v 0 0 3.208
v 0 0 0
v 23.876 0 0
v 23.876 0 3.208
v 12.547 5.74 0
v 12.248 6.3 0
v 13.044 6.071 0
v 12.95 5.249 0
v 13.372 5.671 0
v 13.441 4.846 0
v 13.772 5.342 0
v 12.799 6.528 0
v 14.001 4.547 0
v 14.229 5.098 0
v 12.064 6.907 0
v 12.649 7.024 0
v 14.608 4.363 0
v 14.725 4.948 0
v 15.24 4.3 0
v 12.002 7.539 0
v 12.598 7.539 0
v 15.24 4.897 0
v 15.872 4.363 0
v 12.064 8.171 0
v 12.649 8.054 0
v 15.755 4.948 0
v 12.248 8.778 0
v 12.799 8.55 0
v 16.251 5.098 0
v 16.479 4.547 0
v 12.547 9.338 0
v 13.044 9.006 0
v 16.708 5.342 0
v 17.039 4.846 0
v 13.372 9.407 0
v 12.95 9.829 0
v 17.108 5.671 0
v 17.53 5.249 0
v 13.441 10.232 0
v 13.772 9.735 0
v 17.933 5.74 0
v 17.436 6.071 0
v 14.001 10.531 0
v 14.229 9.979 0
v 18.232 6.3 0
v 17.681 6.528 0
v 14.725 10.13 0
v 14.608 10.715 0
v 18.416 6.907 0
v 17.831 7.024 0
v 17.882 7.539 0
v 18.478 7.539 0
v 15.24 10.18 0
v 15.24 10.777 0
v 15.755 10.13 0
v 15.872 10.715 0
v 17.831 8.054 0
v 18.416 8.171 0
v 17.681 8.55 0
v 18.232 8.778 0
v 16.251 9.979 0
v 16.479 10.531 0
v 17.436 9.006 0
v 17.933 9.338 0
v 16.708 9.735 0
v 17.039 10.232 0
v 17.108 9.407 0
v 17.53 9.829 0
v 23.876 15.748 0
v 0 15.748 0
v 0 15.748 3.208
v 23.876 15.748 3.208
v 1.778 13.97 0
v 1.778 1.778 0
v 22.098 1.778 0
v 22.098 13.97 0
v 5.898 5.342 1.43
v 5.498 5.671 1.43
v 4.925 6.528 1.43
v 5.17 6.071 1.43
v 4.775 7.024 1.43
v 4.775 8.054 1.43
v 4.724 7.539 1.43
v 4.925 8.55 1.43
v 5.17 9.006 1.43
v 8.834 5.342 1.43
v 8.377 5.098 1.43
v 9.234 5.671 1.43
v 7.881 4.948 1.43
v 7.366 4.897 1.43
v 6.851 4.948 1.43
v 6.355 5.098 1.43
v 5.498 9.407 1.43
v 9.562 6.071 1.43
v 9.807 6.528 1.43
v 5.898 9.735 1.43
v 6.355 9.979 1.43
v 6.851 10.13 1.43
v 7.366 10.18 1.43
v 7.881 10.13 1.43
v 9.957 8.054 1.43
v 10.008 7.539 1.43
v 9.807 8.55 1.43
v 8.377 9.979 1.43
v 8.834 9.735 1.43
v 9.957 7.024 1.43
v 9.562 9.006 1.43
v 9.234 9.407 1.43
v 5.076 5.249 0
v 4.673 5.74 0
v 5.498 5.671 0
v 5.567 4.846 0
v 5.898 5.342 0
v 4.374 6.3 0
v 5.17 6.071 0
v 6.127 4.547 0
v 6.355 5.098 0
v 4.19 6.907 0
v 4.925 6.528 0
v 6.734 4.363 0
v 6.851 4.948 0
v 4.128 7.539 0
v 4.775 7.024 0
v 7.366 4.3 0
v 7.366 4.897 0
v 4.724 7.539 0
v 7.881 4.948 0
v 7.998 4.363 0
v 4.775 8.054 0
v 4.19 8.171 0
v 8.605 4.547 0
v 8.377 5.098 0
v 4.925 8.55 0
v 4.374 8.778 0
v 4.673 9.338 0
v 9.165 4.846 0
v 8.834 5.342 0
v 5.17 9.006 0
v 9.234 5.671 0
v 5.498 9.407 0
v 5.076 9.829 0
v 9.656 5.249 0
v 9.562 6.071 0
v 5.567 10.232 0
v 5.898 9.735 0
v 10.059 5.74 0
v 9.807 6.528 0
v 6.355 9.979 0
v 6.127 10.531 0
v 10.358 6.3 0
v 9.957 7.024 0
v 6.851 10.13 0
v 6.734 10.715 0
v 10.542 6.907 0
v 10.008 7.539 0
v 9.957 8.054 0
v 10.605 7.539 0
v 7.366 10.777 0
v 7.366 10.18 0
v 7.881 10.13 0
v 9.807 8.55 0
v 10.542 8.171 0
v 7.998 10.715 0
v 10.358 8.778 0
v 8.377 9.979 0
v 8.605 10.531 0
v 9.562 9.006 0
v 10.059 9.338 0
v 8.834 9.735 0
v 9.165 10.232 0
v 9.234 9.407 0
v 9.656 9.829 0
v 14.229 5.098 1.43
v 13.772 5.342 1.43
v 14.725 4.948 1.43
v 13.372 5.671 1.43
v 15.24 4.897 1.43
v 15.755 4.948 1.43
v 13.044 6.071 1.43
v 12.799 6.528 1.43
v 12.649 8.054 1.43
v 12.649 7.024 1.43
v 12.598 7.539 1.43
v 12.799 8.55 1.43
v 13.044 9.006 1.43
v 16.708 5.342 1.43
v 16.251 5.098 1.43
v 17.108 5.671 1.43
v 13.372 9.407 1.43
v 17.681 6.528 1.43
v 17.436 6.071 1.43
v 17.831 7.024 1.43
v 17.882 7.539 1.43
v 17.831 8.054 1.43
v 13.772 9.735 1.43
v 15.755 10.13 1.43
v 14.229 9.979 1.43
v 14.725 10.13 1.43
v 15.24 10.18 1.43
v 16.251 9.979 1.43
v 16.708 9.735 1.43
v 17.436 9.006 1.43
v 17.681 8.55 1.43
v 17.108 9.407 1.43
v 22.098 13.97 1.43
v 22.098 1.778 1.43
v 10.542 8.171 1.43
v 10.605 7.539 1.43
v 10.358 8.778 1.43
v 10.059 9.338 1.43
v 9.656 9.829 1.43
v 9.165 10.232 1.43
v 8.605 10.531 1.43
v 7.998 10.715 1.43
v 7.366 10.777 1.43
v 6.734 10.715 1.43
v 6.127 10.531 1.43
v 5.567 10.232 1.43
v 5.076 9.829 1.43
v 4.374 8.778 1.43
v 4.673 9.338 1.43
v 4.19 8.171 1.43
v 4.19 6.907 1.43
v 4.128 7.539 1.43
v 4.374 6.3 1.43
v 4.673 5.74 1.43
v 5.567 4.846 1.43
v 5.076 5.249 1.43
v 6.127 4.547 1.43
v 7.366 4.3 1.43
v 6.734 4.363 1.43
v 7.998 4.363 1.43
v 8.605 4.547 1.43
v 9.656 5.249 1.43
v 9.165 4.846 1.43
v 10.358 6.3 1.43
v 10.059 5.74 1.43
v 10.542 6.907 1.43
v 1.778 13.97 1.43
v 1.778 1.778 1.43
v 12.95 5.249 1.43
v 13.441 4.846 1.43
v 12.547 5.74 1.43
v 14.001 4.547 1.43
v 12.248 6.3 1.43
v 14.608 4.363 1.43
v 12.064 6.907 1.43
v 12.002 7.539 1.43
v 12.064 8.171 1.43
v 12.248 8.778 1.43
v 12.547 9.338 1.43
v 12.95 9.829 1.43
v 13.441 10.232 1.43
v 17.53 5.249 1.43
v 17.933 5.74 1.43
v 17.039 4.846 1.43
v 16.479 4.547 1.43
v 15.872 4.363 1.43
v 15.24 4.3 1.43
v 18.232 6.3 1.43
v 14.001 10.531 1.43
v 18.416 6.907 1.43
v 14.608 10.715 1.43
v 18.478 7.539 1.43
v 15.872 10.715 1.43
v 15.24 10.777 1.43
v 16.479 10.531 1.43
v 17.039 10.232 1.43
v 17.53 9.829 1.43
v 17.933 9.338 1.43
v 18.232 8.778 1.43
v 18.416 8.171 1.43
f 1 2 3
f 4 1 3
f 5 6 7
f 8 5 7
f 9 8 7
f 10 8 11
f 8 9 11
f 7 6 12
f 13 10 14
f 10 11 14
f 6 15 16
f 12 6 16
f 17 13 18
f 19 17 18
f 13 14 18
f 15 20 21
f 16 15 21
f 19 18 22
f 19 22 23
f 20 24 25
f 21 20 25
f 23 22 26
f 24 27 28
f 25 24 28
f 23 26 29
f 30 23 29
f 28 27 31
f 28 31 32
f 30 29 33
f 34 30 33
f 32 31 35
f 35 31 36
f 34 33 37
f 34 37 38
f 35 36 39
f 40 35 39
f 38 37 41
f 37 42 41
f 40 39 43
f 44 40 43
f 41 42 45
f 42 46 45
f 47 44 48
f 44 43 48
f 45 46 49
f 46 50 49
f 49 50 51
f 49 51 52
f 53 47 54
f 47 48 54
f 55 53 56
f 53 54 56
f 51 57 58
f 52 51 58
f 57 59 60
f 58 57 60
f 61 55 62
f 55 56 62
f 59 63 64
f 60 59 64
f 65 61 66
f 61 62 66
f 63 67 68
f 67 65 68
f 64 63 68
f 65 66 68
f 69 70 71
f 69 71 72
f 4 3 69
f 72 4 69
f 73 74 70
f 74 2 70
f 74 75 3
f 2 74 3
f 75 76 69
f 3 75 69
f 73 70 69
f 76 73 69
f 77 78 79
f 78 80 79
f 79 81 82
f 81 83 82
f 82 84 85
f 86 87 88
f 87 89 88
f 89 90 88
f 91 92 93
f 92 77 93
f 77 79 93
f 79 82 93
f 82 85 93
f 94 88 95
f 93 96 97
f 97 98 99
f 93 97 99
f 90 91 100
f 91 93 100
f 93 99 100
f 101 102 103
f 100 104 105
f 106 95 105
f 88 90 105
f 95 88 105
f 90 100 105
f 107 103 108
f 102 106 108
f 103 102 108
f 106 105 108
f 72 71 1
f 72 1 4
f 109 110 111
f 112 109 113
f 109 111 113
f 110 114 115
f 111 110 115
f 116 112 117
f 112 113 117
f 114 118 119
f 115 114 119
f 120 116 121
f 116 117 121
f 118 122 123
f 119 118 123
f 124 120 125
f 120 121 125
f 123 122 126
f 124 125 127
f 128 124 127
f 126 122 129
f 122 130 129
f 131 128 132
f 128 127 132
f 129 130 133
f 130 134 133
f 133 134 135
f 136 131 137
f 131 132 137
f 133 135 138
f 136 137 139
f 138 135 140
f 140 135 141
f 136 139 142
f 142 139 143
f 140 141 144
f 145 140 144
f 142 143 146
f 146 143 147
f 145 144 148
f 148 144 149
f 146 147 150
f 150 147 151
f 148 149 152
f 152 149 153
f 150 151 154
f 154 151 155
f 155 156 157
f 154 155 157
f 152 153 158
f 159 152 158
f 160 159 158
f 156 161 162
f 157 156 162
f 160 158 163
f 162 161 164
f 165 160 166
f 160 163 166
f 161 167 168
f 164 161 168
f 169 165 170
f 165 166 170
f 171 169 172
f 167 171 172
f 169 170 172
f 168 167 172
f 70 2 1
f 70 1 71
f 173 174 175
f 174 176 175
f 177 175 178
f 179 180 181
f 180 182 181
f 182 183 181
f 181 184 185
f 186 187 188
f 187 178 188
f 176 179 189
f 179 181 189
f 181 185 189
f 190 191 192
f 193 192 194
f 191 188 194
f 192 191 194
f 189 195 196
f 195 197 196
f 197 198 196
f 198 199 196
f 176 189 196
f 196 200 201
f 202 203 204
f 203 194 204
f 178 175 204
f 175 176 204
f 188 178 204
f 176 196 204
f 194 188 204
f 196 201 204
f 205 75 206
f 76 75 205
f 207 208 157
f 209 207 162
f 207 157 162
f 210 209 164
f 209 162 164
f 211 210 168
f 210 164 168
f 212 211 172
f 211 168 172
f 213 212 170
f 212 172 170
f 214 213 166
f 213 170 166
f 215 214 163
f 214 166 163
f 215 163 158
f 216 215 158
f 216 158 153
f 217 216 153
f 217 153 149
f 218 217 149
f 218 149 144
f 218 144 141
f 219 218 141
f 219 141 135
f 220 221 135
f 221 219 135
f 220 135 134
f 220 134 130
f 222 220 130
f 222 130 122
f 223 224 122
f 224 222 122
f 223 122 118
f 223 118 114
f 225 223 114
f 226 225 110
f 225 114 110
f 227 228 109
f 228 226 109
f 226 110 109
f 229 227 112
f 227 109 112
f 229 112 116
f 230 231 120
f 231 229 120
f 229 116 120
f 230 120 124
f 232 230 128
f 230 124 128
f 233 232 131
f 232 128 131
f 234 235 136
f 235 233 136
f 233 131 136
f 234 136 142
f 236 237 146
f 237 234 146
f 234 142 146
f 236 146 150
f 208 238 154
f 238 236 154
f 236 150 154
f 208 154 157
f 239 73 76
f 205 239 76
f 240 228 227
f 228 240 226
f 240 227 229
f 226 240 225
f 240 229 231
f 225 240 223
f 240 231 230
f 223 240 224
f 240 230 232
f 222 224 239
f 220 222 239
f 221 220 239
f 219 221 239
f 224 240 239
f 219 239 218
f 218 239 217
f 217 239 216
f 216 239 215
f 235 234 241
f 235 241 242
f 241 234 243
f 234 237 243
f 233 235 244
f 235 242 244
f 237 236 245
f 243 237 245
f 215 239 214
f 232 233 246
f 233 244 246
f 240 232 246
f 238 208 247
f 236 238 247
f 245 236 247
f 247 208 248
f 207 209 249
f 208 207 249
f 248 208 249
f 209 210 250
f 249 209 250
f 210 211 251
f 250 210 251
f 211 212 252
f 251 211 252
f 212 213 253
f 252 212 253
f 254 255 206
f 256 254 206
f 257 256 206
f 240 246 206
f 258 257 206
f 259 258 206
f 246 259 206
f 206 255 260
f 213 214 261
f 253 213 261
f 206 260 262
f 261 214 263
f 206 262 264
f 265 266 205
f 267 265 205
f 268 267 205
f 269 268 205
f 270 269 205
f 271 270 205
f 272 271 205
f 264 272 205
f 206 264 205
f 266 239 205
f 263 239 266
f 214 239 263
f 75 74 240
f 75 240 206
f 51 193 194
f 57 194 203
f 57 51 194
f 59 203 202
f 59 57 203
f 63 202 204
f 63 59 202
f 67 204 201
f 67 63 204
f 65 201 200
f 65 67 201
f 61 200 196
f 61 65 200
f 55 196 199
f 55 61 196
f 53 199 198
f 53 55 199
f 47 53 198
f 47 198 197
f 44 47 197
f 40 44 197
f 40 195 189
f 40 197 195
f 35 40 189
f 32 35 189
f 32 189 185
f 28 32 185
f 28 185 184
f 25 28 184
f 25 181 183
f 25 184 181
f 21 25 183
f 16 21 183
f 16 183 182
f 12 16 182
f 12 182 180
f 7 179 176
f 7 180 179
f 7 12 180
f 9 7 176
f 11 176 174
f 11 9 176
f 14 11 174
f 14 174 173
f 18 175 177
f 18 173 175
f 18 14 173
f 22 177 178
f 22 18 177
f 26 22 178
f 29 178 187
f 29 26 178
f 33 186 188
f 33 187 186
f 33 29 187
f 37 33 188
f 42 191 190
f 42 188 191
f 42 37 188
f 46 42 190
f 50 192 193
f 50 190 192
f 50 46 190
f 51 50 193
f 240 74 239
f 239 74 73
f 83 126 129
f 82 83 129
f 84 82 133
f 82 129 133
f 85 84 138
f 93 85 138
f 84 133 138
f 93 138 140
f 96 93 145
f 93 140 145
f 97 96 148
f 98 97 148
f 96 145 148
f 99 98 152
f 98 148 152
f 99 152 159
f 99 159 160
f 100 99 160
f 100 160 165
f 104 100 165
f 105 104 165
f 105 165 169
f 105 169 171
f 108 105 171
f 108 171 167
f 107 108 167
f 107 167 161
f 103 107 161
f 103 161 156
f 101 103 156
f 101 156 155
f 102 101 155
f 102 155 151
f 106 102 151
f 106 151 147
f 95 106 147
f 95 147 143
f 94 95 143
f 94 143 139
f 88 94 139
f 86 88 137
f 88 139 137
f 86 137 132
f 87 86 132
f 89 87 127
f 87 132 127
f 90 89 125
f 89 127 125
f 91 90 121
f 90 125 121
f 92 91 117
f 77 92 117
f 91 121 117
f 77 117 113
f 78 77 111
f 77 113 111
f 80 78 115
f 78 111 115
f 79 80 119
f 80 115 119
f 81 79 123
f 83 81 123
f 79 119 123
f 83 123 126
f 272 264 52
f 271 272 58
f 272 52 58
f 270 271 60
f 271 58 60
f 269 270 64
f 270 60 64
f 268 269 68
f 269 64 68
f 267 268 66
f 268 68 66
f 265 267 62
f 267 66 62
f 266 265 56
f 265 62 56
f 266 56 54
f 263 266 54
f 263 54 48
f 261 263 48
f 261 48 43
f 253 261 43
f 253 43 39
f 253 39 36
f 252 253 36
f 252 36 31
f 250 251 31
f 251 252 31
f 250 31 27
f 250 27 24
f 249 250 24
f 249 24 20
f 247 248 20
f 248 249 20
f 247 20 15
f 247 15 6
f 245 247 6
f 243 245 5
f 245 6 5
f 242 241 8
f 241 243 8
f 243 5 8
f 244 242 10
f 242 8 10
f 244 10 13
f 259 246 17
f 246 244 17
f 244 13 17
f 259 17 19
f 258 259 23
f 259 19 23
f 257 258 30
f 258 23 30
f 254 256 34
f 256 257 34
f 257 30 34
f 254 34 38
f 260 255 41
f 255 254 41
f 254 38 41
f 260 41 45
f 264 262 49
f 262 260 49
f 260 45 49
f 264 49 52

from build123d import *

# Parameters (mm, degrees)
F0_W     = 23.876
F0_H     = 15.748
F1_DEPTH = 3.20802
F3_T     = -1.778
F4_R     = 3.2385
F4_R_2   = 2.6416
F5_DEPTH = 3.06898


# Not quite as in the source:
# - a feature names something its author has since deleted; it is built from what else it names


with BuildPart() as f1:
    # F0 (on Top) → F1 (new body)
    with BuildSketch(Plane.XY):
        with Locations((11.938, 7.874)):
            Rectangle(F0_W, F0_H)
    extrude(amount=F1_DEPTH)

    # F3
    f3_openings = [f1.faces().sort_by_distance(p)[0] for p in [
        (11.938, 7.874, 0),
    ]]
    offset(amount=F3_T, openings=f3_openings)

    # F4 (on face) → F5 (join)
    with BuildSketch(Plane.XY):
        with BuildLine():
            ThreePointArc((4.1275, 7.5388690457), (7.366, 4.3003690457), (10.6045, 7.5388690457))
            ThreePointArc((10.6045, 7.5388690457), (7.366, 10.7773690457), (4.1275, 7.5388690457))
        make_face()
        with BuildLine():
            ThreePointArc((10.0076, 7.5388690457), (7.366, 4.8972690457), (4.7244, 7.5388690457))
            ThreePointArc((4.7244, 7.5388690457), (7.366, 10.1804690457), (10.0076, 7.5388690457))
        make_face(mode=Mode.SUBTRACT)
        with Locations((15.24, 7.5388690457)):
            Circle(F4_R)
        with Locations((15.24, 7.5388690457)):
            Circle(F4_R_2, mode=Mode.SUBTRACT)
    extrude(amount=F5_DEPTH)


solid = f1.part
